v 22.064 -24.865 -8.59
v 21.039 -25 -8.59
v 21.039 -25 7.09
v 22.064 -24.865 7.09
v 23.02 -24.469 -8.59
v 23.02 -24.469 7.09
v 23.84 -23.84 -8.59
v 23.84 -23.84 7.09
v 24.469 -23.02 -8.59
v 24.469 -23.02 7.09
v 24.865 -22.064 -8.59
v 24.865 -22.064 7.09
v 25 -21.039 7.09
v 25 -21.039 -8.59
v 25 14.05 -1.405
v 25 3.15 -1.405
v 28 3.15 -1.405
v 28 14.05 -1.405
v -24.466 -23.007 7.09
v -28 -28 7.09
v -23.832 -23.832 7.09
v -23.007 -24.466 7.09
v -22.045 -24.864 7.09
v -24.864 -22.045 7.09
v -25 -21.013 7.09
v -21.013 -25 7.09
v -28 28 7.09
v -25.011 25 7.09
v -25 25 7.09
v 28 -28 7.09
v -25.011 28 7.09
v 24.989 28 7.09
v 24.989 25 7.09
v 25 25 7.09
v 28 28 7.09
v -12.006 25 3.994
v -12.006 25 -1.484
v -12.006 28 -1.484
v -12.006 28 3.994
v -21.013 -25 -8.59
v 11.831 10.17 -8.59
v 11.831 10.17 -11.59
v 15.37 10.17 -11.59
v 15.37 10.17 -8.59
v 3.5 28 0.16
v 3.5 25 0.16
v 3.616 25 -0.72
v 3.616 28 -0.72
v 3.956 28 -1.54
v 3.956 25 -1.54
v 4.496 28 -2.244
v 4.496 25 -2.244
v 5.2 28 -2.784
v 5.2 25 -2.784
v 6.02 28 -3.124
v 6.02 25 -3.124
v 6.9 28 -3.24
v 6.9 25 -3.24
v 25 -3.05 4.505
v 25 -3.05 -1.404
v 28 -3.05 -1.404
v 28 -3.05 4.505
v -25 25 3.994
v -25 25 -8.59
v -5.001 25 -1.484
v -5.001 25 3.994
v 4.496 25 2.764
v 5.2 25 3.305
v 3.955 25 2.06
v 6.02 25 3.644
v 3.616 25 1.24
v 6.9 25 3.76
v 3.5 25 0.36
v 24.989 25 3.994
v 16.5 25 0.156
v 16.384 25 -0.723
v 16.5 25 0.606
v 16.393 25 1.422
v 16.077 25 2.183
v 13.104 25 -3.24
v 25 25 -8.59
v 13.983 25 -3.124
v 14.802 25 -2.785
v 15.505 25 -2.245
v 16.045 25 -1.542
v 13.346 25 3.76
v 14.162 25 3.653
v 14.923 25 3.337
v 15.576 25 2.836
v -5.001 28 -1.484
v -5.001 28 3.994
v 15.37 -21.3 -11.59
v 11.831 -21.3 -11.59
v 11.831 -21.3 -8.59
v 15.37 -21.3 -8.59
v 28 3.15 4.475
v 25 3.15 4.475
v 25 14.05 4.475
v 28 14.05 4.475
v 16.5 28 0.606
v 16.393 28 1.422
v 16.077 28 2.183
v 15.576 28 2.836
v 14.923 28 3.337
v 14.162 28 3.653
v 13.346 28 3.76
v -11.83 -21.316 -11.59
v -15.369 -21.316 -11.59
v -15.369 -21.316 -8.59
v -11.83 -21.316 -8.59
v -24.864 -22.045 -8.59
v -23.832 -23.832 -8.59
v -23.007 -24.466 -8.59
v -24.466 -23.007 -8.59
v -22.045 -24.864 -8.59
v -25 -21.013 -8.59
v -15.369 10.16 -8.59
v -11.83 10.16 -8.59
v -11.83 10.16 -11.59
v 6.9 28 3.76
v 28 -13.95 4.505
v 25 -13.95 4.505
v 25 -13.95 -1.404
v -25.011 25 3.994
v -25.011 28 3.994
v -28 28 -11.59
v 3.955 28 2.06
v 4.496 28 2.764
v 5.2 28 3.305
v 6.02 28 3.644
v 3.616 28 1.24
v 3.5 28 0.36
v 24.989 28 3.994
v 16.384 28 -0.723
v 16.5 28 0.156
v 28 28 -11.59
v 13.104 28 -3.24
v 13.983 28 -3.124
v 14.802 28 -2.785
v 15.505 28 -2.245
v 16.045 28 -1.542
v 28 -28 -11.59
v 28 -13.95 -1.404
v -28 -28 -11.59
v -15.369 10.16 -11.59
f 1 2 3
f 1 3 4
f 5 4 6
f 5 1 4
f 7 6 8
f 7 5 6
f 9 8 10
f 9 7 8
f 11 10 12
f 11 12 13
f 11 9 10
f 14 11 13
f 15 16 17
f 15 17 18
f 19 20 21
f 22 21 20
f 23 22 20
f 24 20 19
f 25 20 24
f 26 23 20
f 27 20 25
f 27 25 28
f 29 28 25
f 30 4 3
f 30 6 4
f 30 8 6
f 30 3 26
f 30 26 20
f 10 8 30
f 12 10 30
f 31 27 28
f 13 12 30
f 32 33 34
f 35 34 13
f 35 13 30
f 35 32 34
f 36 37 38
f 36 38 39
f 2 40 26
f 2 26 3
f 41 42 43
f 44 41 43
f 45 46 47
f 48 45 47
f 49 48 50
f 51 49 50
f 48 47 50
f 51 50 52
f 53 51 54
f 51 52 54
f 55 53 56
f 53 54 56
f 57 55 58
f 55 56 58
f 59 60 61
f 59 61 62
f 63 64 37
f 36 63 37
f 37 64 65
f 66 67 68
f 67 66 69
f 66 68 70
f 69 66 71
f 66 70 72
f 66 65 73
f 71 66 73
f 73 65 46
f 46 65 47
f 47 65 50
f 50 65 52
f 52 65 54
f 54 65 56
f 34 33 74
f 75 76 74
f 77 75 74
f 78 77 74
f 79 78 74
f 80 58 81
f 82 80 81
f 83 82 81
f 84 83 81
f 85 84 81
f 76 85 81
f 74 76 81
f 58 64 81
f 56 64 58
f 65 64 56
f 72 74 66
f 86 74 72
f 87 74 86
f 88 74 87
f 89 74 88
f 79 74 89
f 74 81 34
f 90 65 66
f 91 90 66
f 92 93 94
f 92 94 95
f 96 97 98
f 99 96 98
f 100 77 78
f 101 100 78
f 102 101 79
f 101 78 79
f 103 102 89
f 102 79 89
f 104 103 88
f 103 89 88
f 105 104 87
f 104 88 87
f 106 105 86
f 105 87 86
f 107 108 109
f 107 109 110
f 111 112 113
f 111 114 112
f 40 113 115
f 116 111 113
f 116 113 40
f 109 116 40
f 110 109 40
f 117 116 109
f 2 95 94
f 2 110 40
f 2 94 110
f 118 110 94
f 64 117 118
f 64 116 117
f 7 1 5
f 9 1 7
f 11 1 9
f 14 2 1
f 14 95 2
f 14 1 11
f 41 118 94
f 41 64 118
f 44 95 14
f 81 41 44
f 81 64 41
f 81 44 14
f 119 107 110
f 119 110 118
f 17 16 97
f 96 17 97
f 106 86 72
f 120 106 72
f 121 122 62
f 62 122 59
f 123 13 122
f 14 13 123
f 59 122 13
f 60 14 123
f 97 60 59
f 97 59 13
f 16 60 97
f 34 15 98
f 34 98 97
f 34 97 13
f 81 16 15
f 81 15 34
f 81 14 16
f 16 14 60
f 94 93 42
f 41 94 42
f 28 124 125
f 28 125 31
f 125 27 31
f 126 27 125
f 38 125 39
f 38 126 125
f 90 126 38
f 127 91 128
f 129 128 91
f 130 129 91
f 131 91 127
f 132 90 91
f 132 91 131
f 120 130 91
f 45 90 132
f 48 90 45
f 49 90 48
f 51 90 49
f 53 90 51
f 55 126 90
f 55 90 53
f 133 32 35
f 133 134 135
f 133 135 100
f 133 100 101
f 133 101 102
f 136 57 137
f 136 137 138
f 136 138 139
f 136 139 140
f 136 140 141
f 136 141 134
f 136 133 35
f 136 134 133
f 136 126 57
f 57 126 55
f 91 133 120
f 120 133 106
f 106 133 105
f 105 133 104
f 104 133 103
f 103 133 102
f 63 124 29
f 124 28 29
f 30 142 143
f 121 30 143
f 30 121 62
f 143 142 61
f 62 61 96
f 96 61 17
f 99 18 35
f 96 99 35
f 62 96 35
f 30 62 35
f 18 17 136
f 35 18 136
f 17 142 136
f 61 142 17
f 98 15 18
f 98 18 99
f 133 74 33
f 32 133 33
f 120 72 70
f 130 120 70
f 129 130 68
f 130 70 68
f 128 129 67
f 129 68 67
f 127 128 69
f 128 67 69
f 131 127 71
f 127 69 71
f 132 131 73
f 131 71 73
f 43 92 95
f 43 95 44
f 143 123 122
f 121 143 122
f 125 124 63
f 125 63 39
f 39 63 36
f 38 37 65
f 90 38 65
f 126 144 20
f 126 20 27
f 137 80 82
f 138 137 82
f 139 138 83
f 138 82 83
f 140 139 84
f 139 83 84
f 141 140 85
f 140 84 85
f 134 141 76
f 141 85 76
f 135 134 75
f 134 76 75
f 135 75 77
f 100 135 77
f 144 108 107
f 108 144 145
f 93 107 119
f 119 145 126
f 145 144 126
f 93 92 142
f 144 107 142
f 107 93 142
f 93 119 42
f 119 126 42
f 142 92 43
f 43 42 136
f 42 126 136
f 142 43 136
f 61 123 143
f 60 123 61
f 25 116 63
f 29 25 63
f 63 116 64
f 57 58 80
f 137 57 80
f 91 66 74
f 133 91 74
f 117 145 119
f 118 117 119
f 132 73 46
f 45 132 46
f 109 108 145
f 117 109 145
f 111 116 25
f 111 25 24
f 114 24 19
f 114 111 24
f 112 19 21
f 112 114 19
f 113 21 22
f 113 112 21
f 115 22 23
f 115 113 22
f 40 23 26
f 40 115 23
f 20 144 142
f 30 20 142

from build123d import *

# Parameters (mm, degrees)
SKETCH_W        = 56
SKETCH_H        = 56
PAD_DEPTH       = 18.68
PAD001_DEPTH    = 17
SKETCH004_W     = 50
SKETCH004_H     = 50
PAD002_DEPTH    = 3
SKETCH005_W     = 3.539247
SKETCH005_H     = 31.476045
SKETCH005_W_2   = 3.539498
SKETCH005_H_2   = 31.470025
POCKET003_DEPTH = 3
POCKET004_DEPTH = 5
POCKET005_DEPTH = 5
SKETCH003_W     = 10.900068
SKETCH003_H     = 5.909133
SKETCH003_W_2   = 10.899807
SKETCH003_H_2   = 5.880531
POCKET006_DEPTH = 10
POCKET007_DEPTH = 5
SKETCH002_W     = 7.004639
SKETCH002_H     = 5.993783
SKETCH002_W_2   = 50
SKETCH002_H_2   = 4
POCKET008_DEPTH = 5


with BuildPart() as part:
    # Sketch → Pad (new body)
    with BuildSketch(Plane.XY.offset(-11.59)):
        Rectangle(SKETCH_W, SKETCH_H)
        with BuildLine():
            Line((-21.013424, -25), (21.039206, -25))
            ThreePointArc((21.039206, -25), (23.83991, -23.83991), (25, -21.039206))
            Line((25, -21.039206), (25, 21.096275))
            Line((25, 21.096275), (25, 25))
            Line((21.096275, 25), (25, 25))
            Line((21.096275, 25), (-20.979066, 25))
            Line((-20.979066, 25), (-25, 25))
            Line((-25, 20.979066), (-25, 25))
            Line((-25, 20.979066), (-25, -21.013424))
            ThreePointArc((-25, -21.013424), (-23.832359, -23.832359), (-21.013424, -25))
        make_face(mode=Mode.SUBTRACT)
    extrude(amount=PAD_DEPTH)

    # Sketch → Pad001 (join)
    with BuildSketch(Plane.XY.offset(-11.59)):
        Rectangle(SKETCH_W, SKETCH_H)
        with BuildLine():
            Line((-21.013424, -25), (21.039206, -25))
            ThreePointArc((21.039206, -25), (23.83991, -23.83991), (25, -21.039206))
            Line((25, -21.039206), (25, 21.096275))
            Line((25, 21.096275), (25, 25))
            Line((21.096275, 25), (25, 25))
            Line((21.096275, 25), (-20.979066, 25))
            Line((-20.979066, 25), (-25, 25))
            Line((-25, 20.979066), (-25, 25))
            Line((-25, 20.979066), (-25, -21.013424))
            ThreePointArc((-25, -21.013424), (-23.832359, -23.832359), (-21.013424, -25))
        make_face(mode=Mode.SUBTRACT)
    extrude(amount=PAD001_DEPTH)

    # Sketch004 (on Sketch) → Pad002 (join)
    with BuildSketch(Plane.XY.offset(-11.59)):
        Rectangle(SKETCH004_W, SKETCH004_H)
    extrude(amount=PAD002_DEPTH)

    # Sketch005 (on Pad) → Pocket003 (cut)
    with BuildSketch(Plane.XY.offset(-11.59)):
        with Locations((-13.5995, -5.578318)):
            Rectangle(SKETCH005_W, SKETCH005_H)
        with Locations((13.600253, -5.565392)):
            Rectangle(SKETCH005_W_2, SKETCH005_H_2)
    extrude(amount=-POCKET003_DEPTH, mode=Mode.SUBTRACT)

    # Sketch005 (on Pad) → Pocket004 (cut)
    with BuildSketch(Plane.XY.offset(-11.59)):
        with Locations((-13.5995, -5.578318)):
            Rectangle(SKETCH005_W, SKETCH005_H)
        with Locations((13.600253, -5.565392)):
            Rectangle(SKETCH005_W_2, SKETCH005_H_2)
    extrude(amount=-POCKET004_DEPTH, mode=Mode.SUBTRACT)

    # Sketch005 (on Pad) → Pocket005 (cut)
    with BuildSketch(Plane.XY.offset(-11.59)):
        with Locations((-13.5995, -5.578318)):
            Rectangle(SKETCH005_W, SKETCH005_H)
        with Locations((13.600253, -5.565392)):
            Rectangle(SKETCH005_W_2, SKETCH005_H_2)
    extrude(amount=POCKET005_DEPTH, mode=Mode.SUBTRACT)

    # Sketch003 → Pocket006 (cut)
    with BuildSketch(Plane(origin=(25, 0, -3), x_dir=(0, 1, 0), z_dir=(1, 0, 0))):
        with Locations((-8.499979, 4.550172)):
            Rectangle(SKETCH003_W, SKETCH003_H)
        with Locations((8.599925, 4.534825)):
            Rectangle(SKETCH003_W_2, SKETCH003_H_2)
    extrude(amount=POCKET006_DEPTH, mode=Mode.SUBTRACT)

    # Sketch001 → Pocket007 (cut)
    with BuildSketch(Plane(origin=(10, 25, 0.26), x_dir=(1, 0, 0), z_dir=(0, -1, 0))):
        with BuildLine():
            Line((-3.099737, -3.5), (3.104045, -3.5))
            ThreePointArc((3.104045, -3.5), (5.505348, -2.505348), (6.5, -0.104045))
            Line((6.5, -0.104045), (6.5, 0.345505))
            ThreePointArc((6.5, 0.345505), (5.57607, 2.57607), (3.345505, 3.5))
            Line((3.345505, 3.5), (-3.100127, 3.5))
            ThreePointArc((-3.100127, 3.5), (-5.5042, 2.5042), (-6.5, 0.100127))
            Line((-6.5, 0.100127), (-6.5, -0.099737))
            ThreePointArc((-6.5, -0.099737), (-5.504086, -2.504086), (-3.099737, -3.5))
        make_face()
    extrude(amount=-POCKET007_DEPTH, mode=Mode.SUBTRACT)

    # Sketch002 → Pocket008 (cut)
    with BuildSketch(Plane(origin=(0, 25, -3), x_dir=(1, 0, 0), z_dir=(0, -1, 0))):
        with Locations((-8.503573, 4.513289)):
            Rectangle(SKETCH002_W, SKETCH002_H)
        with Locations((-0.011459, 8.993781)):
            Rectangle(SKETCH002_W_2, SKETCH002_H_2)
    extrude(amount=-POCKET008_DEPTH, mode=Mode.SUBTRACT)


solid = part.part
